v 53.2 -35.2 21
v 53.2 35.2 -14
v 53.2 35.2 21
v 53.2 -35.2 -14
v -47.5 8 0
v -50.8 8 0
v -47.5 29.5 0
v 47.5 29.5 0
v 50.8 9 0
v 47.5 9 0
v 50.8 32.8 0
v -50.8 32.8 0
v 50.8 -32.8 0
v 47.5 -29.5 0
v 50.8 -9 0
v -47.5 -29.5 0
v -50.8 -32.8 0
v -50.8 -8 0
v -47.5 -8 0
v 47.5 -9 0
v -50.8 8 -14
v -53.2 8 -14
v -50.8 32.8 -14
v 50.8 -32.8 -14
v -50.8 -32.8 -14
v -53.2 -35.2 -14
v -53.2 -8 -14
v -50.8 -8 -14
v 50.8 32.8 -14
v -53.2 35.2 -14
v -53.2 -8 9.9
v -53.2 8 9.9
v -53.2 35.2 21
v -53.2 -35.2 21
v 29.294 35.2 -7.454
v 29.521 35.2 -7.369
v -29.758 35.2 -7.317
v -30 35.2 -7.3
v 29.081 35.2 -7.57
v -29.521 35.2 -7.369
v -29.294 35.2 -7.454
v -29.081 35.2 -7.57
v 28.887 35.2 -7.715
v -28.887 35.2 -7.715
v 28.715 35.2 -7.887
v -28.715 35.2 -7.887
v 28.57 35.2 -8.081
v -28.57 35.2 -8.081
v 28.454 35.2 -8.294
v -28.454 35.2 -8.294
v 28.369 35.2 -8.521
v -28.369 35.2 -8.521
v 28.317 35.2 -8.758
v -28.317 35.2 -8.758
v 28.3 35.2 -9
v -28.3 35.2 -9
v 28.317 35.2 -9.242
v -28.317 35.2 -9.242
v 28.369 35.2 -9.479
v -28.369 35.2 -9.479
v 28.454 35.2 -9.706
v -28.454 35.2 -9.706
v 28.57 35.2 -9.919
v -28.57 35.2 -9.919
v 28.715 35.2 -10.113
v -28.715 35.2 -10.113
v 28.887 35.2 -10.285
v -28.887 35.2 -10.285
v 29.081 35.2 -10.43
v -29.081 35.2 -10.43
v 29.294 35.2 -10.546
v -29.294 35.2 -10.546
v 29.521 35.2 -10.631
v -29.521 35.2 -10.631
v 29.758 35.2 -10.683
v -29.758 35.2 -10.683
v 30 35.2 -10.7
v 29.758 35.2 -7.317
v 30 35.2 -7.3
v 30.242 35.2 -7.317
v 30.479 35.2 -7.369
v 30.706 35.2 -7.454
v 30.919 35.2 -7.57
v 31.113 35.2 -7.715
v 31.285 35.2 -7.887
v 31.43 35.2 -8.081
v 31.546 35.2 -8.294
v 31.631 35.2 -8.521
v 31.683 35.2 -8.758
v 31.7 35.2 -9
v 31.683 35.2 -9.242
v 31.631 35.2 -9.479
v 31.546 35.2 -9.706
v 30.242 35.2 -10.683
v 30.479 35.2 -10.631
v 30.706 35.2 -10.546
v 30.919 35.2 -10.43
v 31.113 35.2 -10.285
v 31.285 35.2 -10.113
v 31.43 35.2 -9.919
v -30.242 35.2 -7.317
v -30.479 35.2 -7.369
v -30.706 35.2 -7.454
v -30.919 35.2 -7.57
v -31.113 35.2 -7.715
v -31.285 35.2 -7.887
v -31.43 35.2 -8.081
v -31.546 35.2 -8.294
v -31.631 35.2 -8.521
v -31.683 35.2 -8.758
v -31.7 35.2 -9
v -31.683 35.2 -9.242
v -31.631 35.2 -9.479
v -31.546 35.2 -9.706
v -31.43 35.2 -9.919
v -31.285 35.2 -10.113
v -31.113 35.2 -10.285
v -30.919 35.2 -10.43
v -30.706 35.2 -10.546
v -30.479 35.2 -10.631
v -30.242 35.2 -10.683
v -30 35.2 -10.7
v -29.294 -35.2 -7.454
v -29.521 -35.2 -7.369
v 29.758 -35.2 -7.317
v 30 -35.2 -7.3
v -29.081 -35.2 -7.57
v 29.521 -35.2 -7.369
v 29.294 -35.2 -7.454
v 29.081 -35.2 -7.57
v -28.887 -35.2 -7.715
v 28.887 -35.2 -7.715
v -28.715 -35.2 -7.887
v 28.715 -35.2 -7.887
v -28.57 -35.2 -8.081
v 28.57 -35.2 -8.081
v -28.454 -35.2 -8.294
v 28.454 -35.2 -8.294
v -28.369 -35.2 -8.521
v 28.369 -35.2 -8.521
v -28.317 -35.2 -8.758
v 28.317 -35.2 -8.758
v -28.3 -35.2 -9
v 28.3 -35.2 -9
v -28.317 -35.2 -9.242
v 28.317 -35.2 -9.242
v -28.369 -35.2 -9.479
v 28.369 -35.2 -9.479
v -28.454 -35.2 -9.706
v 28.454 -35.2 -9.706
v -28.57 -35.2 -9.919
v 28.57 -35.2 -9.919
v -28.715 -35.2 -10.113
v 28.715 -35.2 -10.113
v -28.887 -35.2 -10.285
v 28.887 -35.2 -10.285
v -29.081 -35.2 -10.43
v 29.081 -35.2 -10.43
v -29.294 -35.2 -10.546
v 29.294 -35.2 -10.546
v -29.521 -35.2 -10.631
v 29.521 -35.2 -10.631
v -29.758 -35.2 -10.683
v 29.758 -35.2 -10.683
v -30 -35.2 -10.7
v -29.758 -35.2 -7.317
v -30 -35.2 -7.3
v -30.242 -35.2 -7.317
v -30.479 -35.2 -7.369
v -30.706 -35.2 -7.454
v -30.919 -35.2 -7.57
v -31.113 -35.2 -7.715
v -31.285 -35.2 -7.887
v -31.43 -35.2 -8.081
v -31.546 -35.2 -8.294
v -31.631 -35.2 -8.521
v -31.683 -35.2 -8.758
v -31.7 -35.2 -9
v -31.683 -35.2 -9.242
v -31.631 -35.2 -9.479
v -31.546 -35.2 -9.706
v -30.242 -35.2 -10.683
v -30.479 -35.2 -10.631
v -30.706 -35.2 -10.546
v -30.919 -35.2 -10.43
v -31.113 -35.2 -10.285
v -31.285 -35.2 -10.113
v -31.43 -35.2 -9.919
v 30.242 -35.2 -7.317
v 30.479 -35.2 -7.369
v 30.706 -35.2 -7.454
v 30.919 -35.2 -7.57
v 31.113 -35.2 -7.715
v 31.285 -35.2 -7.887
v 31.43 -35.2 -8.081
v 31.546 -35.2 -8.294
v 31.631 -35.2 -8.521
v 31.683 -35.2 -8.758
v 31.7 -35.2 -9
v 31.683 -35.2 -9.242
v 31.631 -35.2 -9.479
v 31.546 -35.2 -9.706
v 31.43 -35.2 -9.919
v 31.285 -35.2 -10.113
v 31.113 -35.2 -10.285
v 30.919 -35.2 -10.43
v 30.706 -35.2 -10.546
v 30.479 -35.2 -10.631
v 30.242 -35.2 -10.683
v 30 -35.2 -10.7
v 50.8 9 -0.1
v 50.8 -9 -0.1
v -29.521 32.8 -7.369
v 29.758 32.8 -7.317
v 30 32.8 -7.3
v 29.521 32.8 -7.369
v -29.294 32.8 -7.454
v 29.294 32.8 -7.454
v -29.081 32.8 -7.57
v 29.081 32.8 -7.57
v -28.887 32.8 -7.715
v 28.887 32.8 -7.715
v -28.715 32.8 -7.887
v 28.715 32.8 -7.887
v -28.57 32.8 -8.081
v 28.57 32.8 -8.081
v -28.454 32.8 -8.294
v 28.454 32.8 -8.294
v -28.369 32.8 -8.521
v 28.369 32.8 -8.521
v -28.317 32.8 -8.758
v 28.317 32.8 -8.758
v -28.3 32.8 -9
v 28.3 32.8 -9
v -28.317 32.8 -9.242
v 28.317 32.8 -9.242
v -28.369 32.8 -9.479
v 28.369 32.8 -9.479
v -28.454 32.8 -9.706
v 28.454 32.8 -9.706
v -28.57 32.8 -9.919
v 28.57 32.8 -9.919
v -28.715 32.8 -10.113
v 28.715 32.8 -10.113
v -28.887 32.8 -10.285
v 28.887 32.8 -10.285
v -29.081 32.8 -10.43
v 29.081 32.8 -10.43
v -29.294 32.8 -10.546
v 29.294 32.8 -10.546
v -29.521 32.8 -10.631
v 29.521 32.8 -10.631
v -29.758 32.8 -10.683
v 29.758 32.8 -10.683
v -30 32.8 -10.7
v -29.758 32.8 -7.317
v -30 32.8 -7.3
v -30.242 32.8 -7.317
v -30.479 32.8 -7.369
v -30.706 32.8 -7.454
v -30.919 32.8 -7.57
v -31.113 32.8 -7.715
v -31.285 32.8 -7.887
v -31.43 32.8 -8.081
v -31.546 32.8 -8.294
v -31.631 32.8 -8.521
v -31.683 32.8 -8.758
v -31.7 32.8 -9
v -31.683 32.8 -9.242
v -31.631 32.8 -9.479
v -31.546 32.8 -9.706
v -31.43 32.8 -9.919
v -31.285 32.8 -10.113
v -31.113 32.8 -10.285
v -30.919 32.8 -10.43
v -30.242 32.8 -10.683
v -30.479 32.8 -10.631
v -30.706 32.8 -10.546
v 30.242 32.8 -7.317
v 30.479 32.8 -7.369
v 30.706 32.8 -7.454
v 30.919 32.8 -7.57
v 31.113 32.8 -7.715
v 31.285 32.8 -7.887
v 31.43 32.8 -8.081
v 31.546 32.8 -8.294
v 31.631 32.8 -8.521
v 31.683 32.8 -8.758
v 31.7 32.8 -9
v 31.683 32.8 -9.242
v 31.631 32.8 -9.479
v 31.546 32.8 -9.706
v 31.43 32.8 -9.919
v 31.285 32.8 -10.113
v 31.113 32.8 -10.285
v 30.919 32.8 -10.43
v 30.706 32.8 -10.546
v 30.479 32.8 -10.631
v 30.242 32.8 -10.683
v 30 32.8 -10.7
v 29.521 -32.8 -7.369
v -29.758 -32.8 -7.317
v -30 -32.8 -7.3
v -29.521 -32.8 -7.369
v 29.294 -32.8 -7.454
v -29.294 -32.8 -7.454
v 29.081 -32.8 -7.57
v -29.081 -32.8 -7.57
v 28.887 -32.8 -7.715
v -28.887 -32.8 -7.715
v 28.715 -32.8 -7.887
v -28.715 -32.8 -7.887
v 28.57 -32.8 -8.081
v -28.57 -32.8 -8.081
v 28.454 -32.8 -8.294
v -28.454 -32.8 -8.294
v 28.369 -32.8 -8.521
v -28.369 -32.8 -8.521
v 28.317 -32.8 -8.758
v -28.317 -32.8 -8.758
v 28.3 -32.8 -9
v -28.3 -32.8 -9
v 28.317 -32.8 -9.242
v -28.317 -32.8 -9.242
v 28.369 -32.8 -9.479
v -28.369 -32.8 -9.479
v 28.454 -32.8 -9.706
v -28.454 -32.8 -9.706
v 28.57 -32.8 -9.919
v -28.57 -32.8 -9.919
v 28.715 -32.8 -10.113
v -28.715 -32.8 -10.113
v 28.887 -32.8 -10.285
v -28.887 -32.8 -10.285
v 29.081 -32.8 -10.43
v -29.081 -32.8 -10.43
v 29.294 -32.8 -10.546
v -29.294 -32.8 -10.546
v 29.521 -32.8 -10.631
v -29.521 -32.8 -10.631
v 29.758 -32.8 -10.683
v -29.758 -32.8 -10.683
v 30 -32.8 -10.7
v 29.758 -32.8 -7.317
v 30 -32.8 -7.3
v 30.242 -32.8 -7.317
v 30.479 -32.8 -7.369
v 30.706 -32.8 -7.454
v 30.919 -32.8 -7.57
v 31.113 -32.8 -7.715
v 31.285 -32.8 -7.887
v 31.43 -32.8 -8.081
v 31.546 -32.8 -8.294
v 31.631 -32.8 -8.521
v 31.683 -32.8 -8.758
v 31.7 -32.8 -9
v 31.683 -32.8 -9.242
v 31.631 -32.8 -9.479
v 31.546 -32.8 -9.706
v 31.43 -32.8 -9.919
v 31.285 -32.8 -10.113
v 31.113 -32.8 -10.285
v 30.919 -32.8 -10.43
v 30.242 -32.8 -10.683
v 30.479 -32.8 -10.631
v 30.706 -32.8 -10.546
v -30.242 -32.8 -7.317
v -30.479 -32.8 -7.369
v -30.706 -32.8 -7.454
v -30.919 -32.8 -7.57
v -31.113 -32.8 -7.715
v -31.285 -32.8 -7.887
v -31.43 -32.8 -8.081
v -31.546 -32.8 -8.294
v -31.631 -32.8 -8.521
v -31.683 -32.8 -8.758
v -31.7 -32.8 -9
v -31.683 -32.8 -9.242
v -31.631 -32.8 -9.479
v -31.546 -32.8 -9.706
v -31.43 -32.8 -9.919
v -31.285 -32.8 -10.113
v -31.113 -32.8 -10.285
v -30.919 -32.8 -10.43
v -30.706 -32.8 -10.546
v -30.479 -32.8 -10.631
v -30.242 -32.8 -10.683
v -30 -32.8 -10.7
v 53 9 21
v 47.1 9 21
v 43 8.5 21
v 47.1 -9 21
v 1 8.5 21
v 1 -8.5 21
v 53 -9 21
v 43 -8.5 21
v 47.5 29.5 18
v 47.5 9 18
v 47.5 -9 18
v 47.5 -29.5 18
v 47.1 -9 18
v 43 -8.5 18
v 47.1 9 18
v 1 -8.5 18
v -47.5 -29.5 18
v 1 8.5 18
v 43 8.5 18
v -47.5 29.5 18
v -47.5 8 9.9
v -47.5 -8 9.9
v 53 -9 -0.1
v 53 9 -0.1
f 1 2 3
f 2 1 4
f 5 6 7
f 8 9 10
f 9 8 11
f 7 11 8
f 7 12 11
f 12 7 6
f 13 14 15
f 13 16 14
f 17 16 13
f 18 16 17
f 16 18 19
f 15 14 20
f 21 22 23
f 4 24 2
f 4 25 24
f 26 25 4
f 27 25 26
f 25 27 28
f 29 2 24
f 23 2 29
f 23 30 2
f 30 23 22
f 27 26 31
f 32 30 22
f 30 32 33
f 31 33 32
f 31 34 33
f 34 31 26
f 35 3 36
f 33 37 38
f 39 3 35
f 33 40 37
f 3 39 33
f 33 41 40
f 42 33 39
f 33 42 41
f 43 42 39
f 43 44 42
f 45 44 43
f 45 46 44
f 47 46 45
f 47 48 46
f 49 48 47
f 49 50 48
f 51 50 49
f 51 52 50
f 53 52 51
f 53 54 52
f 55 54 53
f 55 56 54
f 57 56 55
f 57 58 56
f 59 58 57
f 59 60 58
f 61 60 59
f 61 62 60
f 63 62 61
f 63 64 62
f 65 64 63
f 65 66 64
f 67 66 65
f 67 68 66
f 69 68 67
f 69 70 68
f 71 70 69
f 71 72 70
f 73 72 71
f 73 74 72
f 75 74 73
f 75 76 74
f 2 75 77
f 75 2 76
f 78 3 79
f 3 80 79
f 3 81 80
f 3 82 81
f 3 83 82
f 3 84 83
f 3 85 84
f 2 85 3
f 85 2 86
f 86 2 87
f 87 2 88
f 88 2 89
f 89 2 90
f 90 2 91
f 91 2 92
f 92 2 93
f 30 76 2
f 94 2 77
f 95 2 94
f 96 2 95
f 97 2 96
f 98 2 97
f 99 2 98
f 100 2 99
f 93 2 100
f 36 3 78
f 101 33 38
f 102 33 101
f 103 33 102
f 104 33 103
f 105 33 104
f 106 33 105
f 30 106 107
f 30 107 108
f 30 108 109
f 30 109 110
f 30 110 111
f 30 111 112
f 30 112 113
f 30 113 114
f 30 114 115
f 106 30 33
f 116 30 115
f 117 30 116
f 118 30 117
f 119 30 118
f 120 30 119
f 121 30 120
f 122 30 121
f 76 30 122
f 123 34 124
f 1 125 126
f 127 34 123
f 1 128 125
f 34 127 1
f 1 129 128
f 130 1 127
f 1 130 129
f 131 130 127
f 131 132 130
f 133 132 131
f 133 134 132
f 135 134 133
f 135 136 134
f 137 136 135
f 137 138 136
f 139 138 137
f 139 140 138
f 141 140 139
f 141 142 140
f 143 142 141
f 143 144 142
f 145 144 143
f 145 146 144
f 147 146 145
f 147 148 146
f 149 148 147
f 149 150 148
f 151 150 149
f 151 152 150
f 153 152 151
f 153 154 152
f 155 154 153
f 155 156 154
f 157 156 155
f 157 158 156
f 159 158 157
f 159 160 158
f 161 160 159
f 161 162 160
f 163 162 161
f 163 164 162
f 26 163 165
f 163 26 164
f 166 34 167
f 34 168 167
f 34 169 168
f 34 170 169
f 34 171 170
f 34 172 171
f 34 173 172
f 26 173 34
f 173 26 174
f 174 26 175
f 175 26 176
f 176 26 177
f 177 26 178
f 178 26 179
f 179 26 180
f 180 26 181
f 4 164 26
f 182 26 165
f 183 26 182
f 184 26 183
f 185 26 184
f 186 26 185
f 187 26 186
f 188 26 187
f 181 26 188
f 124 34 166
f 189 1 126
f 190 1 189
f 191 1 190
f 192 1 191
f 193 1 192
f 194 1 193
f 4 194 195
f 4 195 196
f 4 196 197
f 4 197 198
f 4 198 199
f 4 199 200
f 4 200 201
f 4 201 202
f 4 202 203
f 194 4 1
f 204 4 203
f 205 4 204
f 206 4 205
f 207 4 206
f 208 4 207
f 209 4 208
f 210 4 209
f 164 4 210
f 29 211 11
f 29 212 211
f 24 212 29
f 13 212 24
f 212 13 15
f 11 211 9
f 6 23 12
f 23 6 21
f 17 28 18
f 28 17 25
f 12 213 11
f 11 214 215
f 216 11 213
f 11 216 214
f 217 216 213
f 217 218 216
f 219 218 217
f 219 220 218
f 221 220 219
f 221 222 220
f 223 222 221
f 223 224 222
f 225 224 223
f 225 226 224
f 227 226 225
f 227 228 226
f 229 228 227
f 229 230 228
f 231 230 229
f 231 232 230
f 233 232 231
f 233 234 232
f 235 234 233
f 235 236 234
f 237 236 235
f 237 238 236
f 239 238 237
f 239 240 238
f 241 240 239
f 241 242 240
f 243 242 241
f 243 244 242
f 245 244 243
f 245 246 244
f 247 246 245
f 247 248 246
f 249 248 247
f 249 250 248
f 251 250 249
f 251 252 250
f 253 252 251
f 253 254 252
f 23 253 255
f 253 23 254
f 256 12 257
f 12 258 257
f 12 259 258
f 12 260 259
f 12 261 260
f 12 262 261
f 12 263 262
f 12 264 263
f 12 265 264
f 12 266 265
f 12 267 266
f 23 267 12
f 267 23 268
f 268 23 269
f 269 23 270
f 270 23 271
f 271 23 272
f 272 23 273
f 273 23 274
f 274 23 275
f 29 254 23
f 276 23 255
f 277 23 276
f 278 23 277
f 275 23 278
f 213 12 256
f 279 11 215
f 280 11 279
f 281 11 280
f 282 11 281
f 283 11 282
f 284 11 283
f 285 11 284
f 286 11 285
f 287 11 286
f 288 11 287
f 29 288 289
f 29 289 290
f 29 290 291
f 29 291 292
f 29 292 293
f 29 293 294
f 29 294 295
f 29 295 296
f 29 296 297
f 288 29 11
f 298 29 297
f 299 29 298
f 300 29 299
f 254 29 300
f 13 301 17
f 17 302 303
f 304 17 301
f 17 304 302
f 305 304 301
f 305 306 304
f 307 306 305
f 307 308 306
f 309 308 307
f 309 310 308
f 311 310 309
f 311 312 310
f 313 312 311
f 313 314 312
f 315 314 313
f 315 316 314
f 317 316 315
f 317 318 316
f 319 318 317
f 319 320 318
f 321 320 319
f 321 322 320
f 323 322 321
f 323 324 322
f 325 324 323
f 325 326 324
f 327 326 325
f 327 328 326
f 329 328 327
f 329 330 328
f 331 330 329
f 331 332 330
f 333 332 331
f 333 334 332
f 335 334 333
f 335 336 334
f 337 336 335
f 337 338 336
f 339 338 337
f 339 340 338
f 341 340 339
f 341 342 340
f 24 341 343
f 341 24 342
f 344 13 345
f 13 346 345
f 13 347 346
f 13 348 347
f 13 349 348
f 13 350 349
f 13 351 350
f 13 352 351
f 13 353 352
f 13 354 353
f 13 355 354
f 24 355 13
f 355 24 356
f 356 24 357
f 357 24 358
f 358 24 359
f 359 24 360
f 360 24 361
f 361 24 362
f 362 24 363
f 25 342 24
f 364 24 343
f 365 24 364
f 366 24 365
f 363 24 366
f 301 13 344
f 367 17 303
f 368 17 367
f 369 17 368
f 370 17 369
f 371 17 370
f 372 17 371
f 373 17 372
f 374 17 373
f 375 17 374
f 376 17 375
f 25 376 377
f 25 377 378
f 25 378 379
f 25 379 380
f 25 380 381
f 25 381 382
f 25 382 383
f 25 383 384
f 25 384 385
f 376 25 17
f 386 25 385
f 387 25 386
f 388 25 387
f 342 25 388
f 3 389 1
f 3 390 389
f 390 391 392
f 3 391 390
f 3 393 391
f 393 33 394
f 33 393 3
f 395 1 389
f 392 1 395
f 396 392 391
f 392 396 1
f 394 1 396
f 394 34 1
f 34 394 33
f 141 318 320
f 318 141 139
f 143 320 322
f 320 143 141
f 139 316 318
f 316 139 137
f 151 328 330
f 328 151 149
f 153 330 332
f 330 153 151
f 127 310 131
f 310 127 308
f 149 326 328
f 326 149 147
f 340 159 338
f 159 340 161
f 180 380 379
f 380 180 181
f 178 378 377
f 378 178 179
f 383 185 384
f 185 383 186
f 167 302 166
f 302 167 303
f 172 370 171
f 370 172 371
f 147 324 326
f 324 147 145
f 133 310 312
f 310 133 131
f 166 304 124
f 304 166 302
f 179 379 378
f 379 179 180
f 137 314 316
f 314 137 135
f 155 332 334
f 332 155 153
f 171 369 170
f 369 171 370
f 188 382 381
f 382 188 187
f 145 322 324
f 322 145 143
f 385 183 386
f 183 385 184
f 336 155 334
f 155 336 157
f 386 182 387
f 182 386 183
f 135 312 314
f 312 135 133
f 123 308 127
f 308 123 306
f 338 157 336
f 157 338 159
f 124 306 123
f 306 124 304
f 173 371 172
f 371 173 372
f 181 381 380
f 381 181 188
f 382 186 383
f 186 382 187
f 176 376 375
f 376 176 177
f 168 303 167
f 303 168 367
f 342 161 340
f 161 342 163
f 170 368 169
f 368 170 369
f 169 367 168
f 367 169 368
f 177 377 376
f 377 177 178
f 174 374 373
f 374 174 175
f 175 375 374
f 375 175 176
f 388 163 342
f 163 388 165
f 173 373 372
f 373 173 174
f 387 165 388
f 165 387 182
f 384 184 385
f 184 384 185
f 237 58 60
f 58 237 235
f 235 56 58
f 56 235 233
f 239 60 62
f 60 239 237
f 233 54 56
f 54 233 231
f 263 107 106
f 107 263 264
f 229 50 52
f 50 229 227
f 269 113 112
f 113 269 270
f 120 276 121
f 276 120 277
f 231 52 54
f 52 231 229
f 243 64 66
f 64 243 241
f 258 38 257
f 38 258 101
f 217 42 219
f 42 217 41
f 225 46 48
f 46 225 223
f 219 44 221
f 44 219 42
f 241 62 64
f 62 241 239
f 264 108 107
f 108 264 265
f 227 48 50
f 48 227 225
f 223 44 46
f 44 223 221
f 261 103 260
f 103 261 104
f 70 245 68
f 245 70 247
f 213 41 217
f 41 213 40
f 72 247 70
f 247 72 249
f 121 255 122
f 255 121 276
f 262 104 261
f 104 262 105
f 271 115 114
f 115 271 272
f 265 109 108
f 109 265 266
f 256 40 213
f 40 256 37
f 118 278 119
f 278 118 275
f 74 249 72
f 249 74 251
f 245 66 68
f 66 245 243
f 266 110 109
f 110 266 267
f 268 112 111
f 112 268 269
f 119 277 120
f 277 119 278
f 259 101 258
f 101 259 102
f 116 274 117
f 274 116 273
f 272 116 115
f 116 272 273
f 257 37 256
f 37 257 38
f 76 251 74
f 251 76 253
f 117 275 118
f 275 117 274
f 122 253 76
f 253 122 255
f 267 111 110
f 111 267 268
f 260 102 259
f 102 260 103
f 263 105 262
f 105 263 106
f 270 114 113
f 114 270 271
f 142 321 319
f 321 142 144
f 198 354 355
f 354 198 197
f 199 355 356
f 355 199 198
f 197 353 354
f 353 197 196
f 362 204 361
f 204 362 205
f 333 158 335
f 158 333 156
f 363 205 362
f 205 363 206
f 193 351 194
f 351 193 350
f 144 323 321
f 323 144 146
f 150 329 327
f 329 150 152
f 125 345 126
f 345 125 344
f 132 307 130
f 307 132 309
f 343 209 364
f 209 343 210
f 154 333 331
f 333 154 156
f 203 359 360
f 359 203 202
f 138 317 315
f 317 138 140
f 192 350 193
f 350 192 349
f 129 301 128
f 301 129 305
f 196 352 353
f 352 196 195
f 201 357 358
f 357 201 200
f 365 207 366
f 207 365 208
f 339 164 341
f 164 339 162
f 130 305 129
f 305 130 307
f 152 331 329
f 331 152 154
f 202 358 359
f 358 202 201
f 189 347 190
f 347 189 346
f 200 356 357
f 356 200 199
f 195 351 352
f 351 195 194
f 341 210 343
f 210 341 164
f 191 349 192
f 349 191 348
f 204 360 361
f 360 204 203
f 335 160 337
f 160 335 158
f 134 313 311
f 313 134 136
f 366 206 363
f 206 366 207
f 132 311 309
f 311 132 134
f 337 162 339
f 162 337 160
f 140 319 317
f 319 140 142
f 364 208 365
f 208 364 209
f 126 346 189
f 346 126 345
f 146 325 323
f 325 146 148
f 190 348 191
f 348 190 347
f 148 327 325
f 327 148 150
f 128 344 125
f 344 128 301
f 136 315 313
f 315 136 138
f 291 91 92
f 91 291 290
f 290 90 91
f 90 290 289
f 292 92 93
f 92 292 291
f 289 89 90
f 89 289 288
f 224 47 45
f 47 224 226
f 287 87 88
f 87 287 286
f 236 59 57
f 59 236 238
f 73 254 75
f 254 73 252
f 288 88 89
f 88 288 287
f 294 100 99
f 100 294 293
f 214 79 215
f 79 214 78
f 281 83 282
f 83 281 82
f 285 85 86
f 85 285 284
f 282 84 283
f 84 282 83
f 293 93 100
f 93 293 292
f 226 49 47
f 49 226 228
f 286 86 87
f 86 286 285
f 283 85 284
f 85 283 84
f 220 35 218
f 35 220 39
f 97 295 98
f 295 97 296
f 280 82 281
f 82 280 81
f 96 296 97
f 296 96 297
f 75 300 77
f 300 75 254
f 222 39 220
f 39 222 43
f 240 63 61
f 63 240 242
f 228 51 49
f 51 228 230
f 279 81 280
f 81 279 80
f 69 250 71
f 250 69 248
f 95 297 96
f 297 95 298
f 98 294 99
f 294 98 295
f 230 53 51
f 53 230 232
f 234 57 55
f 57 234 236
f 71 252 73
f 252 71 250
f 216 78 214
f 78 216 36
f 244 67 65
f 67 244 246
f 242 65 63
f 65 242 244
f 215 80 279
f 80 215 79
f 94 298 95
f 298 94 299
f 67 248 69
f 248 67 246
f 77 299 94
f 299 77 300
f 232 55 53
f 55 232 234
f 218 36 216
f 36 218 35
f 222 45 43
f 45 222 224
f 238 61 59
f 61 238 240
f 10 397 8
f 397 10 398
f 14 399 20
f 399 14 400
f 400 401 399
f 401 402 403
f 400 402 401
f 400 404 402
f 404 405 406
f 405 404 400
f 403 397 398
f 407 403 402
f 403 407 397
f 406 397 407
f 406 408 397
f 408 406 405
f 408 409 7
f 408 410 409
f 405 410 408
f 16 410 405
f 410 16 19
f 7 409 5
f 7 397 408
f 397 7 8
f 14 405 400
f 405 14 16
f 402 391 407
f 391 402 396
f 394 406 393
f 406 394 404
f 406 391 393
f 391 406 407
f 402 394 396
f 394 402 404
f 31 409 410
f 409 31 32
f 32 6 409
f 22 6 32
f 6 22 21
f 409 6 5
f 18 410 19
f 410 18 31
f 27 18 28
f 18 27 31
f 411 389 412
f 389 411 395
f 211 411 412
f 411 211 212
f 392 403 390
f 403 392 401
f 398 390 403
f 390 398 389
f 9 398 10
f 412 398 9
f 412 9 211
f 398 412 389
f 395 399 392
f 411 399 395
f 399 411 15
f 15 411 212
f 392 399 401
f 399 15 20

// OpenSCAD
// ============================================================================
// CyberWing — LilyGo TOP COVER (mates the deep base, sandwiches the plate)
// Completes the stack: deep base (make_base_deep) + existing 101×65 top plate
// (T-Beam on 5 mm bosses, 18650 holder hanging through the cutout) + THIS.
// The cover's skirt wraps the base's outer wall and self-taps into it with 4
// side M3s, clamping the plate between cover and base rim — no shared axes.
// Openings: OLED window, USB-C cable slot (bottom -X end, open downward so the
// cover drops on with the cable attached), antenna notch (top +X end for the
// SMA elbow, whip outside).
//   Model: z=0 at the PLATE TOP, cover rises +z; skirt hangs -z over the base.
// CONFIRM: CAV_H (tallest point above the plate), window/slot positions.
// part = "cover" | "coverprint" (flipped for the bed)
// ============================================================================
$fn = 44;
part = "cover";

// ---- stack interfaces ----
L = 101; W = 65;                 // plate/base footprint
PLATE_T = 4;                     // existing plate
CAV_H = 18;                      // interior above the plate top (MEASURE: acrylic top + clr)
WALL = 3; ROOF = 3;
SK_T = 2.4; SK_CLR = 0.3;        // skirt over the base wall
SK_ENG = 10;                     // skirt engagement below the plate underside
M3 = 3.4; PILOT = 2.7;
SCREW_X = [-30, 30];             // skirt screws, both long sides

// ---- openings (positions from the photos — CONFIRM) ----
OLED_W = 42; OLED_H = 17; OLED_X = 22;    // window centered at x=+22 (upper board)
USB_W = 16;                                // bottom (-X) cable slot, open downward
ANT_W = 18; ANT_X0 = 8;                    // top (+X) antenna notch in roof+wall

HTOT = CAV_H + ROOF;             // above plate
SK_DEP = PLATE_T + SK_ENG;       // skirt drop below z=0

module cover() {
  difference() {
    union() {
      // shell above the plate
      translate([-L/2-SK_CLR-SK_T, -W/2-SK_CLR-SK_T, 0])
        cube([L+2*(SK_CLR+SK_T), W+2*(SK_CLR+SK_T), HTOT]);
      // skirt hanging over plate edge + base wall
      difference() {
        translate([-L/2-SK_CLR-SK_T, -W/2-SK_CLR-SK_T, -SK_DEP])
          cube([L+2*(SK_CLR+SK_T), W+2*(SK_CLR+SK_T), SK_DEP]);
        translate([-L/2-SK_CLR, -W/2-SK_CLR, -SK_DEP-0.1])
          cube([L+2*SK_CLR, W+2*SK_CLR, SK_DEP+0.2]);
      }
    }
    // interior cavity (walls inset WALL from the plate edge)
    translate([-L/2+WALL, -W/2+WALL, -0.1]) cube([L-2*WALL, W-2*WALL, CAV_H+0.1]);
    // OLED window
    translate([OLED_X-OLED_W/2, -OLED_H/2, CAV_H-0.1]) cube([OLED_W, OLED_H, ROOF+0.2]);
    // USB-C slot: bottom (-X) end, open down through the skirt
    translate([-L/2-SK_CLR-SK_T-0.1, -USB_W/2, -SK_DEP-0.1])
      cube([WALL+SK_CLR+SK_T+0.2, USB_W, SK_DEP+CAV_H*0.55+0.1]);
    // antenna notch: top (+X) end wall + roof strip (SMA elbow + whip out)
    translate([L/2-WALL-SK_CLR-0.1, -ANT_W/2, -0.1]) cube([WALL+SK_CLR+SK_T+0.2, ANT_W, HTOT+0.2]);
    // skirt screw holes (self-tap into the base wall)
    for (fx=SCREW_X, sy=[-1,1])
      translate([fx, sy*(W/2+SK_CLR+SK_T/2), -PLATE_T-SK_ENG/2])
        rotate([sy>0?-90:90,0,0]) cylinder(d=M3, h=SK_T+0.4, center=true);
  }
}

if (part=="cover") cover();
if (part=="coverprint") translate([0,0,HTOT]) rotate([180,0,0]) cover();
